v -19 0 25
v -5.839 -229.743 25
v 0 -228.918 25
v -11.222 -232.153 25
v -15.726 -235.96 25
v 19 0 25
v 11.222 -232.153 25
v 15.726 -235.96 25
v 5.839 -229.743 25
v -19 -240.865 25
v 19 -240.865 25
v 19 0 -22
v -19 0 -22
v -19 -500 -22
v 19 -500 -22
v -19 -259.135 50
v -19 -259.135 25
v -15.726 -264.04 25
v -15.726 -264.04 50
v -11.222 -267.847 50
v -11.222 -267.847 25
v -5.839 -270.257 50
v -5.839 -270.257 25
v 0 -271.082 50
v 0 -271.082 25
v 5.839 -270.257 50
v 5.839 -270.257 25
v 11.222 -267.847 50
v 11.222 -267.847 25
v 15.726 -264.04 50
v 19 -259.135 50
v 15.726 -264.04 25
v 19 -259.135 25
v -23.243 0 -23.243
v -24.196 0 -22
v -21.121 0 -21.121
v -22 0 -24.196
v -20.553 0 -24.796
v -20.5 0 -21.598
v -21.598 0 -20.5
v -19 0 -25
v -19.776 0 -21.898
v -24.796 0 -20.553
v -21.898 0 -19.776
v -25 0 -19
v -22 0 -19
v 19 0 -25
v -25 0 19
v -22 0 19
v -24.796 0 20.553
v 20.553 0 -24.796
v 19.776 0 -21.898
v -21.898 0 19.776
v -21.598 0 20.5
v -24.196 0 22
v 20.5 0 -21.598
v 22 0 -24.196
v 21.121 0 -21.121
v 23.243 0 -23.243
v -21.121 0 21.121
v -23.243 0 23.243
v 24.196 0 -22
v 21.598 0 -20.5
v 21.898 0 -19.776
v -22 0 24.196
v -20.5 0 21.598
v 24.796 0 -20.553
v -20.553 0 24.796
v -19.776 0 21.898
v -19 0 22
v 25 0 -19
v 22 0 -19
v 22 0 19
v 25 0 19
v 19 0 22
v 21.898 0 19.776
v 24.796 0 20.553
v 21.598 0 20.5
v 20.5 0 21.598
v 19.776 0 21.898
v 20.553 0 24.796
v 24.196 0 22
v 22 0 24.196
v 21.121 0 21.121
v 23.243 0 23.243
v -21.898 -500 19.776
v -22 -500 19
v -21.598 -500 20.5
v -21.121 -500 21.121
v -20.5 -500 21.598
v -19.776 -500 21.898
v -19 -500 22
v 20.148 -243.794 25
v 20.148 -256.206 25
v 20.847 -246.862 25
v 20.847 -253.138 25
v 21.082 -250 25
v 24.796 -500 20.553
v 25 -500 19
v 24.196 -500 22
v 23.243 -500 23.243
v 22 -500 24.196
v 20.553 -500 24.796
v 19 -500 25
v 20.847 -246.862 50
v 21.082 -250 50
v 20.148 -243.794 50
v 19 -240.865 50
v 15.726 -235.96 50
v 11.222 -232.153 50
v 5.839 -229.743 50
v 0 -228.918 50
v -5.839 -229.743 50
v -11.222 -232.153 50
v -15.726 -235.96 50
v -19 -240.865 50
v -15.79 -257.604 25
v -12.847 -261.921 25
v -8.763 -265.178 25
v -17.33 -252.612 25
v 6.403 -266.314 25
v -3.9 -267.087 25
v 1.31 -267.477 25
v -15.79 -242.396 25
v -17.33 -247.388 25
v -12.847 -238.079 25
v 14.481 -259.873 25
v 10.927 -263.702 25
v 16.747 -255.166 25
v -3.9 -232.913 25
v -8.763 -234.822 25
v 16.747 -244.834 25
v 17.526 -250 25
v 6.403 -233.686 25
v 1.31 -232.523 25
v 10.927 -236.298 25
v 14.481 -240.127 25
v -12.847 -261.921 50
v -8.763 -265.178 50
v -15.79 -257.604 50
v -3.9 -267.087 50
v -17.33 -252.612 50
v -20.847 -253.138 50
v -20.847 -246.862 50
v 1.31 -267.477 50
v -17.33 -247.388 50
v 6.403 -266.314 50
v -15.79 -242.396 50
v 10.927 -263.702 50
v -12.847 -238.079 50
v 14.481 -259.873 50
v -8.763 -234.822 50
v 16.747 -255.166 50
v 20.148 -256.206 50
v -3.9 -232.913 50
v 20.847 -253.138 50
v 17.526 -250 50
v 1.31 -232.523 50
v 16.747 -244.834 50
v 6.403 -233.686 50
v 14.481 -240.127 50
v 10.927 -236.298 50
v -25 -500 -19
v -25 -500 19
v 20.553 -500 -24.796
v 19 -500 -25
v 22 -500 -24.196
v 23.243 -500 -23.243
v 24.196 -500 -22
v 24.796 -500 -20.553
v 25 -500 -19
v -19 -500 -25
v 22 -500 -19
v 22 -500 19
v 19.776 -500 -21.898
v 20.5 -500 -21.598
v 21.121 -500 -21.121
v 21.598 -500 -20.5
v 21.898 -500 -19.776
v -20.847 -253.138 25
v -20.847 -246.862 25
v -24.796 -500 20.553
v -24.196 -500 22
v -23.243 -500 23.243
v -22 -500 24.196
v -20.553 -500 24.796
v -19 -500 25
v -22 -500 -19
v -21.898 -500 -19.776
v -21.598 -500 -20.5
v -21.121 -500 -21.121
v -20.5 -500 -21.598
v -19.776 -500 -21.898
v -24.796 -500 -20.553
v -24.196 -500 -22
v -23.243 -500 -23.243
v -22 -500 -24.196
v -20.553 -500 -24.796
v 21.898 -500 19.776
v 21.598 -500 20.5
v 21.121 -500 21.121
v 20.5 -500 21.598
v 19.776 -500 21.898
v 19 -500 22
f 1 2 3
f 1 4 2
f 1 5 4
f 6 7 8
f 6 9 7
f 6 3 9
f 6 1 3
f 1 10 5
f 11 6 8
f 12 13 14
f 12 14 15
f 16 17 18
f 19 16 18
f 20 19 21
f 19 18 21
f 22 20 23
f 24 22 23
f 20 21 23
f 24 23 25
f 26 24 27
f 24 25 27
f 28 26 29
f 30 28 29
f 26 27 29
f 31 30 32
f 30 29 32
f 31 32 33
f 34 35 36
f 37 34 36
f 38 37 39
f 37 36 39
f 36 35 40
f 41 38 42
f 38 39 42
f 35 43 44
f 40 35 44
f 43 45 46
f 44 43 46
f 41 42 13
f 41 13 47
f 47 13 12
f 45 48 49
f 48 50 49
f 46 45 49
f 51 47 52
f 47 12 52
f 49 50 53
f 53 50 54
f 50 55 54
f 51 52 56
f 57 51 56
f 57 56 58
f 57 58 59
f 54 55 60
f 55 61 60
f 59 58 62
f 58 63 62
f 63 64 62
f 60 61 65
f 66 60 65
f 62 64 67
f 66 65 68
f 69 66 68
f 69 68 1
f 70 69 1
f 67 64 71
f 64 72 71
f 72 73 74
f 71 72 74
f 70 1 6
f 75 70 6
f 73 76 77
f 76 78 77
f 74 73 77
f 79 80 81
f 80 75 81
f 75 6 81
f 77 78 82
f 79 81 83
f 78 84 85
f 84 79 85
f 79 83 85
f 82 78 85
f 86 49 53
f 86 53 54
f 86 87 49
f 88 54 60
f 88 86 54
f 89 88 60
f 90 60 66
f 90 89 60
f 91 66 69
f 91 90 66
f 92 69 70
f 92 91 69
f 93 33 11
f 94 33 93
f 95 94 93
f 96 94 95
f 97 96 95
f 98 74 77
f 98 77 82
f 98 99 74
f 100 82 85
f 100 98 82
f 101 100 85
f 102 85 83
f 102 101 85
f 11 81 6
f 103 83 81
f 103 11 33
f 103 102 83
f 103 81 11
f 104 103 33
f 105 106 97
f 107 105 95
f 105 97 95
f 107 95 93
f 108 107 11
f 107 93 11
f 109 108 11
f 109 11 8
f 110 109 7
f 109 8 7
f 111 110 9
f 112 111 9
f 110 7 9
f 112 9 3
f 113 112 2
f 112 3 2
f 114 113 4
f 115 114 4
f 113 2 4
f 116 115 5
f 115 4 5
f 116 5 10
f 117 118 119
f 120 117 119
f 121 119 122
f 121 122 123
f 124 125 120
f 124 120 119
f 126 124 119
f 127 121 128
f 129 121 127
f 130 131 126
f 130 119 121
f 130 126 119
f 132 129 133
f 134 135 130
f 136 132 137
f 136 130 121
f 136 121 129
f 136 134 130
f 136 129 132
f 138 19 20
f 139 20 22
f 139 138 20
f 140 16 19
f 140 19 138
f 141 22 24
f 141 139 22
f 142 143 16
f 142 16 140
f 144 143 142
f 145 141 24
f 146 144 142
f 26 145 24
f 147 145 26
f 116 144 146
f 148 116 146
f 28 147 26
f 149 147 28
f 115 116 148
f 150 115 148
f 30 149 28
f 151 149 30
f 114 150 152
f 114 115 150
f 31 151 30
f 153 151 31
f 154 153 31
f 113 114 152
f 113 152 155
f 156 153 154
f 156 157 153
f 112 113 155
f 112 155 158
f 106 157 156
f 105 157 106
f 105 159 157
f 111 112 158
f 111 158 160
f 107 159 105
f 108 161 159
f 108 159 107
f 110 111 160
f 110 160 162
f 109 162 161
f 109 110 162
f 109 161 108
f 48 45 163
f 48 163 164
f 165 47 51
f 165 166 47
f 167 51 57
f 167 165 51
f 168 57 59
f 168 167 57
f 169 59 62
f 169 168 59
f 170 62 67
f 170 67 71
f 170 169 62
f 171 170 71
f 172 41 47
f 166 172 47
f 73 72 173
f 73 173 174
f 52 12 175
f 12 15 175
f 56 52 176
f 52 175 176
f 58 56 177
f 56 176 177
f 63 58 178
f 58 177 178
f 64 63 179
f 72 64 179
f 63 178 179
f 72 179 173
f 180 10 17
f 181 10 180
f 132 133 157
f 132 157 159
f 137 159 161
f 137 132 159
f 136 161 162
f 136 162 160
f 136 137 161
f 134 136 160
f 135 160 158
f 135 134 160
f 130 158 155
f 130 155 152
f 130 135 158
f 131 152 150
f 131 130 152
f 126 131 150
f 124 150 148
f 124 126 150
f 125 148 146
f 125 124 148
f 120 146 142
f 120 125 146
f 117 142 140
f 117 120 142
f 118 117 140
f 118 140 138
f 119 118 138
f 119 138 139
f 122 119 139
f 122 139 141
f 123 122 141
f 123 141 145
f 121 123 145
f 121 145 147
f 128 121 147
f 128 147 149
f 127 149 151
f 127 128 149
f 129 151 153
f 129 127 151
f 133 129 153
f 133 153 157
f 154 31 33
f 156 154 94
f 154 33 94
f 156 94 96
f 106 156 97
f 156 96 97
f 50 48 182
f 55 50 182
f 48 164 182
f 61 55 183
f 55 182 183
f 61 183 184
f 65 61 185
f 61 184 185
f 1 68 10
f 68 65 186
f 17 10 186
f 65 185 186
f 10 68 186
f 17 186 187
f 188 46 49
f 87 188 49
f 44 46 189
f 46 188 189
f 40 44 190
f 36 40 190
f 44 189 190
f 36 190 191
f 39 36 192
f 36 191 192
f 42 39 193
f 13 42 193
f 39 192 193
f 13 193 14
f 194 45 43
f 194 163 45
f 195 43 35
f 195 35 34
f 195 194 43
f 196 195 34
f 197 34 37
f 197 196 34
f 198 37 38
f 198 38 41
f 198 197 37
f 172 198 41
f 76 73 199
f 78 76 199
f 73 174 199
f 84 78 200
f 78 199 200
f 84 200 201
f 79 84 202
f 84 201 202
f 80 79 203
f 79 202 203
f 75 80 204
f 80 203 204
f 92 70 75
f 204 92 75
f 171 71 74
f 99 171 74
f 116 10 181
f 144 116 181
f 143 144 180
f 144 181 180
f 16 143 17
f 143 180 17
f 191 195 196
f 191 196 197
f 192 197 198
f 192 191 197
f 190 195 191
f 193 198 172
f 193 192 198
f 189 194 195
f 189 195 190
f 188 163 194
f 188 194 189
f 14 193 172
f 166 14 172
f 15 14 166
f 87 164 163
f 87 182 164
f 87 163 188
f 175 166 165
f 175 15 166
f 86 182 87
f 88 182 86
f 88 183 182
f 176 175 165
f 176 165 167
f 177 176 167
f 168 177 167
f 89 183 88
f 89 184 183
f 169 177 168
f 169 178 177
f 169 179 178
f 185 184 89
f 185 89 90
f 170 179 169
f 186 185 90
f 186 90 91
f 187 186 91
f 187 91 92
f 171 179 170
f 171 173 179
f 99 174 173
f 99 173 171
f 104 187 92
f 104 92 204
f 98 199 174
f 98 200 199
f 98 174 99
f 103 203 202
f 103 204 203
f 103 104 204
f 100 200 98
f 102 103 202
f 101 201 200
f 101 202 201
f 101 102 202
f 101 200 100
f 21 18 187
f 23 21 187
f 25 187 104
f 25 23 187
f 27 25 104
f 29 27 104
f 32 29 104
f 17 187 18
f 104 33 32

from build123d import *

# Parameters (mm, degrees)
F0_W     = 50
F0_H     = 50
F1_DEPTH = 500
F2_R     = 6
F3_T     = -3
F4_R     = 17.526
F5_DEPTH = 25


with BuildPart() as f1:
    # F0 (on Front) → F1 (new body)
    with BuildSketch(Plane.XZ):
        Rectangle(F0_W, F0_H)
    extrude(amount=F1_DEPTH)

    # F2
    f2_edges = [f1.edges().sort_by_distance(p)[0] for p in [
        (25, -250, 25),
        (-25, -250, 25),
        (25, -250, -25),
        (-25, -250, -25),
    ]]
    fillet(f2_edges, radius=F2_R)

    # F3
    f3_openings = [f1.faces().sort_by_distance(p)[0] for p in [
        (0, 0, 0),
        (0, -500, 0),
    ]]
    offset(amount=F3_T, openings=f3_openings)

    # F4 (on face) → F5 (join)
    with BuildSketch(Plane.XY.offset(25)):
        with BuildLine():
            ThreePointArc((19, -259.1351367806), (20.5549108974, -254.6846944404), (21.082, -250))
            ThreePointArc((21.082, -250), (20.5549108974, -245.3153055596), (19, -240.8648632194))
            Line((19, -240.8648632194), (19, -259.1351367806))
        make_face()
        with BuildLine():
            Line((19, -259.1351367806), (19, -240.8648632194))
            ThreePointArc((19, -240.8648632194), (0, -228.918), (-19, -240.8648632194))
            Line((-19, -240.8648632194), (-19, -259.1351367806))
            ThreePointArc((-19, -259.1351367806), (0, -271.082), (19, -259.1351367806))
        make_face()
        with Locations((0, -250)):
            Circle(F4_R, mode=Mode.SUBTRACT)
        with BuildLine():
            Line((-19, -259.1351367806), (-19, -240.8648632194))
            ThreePointArc((-19, -240.8648632194), (-21.082, -250), (-19, -259.1351367806))
        make_face()
    extrude(amount=F5_DEPTH)


solid = f1.part
